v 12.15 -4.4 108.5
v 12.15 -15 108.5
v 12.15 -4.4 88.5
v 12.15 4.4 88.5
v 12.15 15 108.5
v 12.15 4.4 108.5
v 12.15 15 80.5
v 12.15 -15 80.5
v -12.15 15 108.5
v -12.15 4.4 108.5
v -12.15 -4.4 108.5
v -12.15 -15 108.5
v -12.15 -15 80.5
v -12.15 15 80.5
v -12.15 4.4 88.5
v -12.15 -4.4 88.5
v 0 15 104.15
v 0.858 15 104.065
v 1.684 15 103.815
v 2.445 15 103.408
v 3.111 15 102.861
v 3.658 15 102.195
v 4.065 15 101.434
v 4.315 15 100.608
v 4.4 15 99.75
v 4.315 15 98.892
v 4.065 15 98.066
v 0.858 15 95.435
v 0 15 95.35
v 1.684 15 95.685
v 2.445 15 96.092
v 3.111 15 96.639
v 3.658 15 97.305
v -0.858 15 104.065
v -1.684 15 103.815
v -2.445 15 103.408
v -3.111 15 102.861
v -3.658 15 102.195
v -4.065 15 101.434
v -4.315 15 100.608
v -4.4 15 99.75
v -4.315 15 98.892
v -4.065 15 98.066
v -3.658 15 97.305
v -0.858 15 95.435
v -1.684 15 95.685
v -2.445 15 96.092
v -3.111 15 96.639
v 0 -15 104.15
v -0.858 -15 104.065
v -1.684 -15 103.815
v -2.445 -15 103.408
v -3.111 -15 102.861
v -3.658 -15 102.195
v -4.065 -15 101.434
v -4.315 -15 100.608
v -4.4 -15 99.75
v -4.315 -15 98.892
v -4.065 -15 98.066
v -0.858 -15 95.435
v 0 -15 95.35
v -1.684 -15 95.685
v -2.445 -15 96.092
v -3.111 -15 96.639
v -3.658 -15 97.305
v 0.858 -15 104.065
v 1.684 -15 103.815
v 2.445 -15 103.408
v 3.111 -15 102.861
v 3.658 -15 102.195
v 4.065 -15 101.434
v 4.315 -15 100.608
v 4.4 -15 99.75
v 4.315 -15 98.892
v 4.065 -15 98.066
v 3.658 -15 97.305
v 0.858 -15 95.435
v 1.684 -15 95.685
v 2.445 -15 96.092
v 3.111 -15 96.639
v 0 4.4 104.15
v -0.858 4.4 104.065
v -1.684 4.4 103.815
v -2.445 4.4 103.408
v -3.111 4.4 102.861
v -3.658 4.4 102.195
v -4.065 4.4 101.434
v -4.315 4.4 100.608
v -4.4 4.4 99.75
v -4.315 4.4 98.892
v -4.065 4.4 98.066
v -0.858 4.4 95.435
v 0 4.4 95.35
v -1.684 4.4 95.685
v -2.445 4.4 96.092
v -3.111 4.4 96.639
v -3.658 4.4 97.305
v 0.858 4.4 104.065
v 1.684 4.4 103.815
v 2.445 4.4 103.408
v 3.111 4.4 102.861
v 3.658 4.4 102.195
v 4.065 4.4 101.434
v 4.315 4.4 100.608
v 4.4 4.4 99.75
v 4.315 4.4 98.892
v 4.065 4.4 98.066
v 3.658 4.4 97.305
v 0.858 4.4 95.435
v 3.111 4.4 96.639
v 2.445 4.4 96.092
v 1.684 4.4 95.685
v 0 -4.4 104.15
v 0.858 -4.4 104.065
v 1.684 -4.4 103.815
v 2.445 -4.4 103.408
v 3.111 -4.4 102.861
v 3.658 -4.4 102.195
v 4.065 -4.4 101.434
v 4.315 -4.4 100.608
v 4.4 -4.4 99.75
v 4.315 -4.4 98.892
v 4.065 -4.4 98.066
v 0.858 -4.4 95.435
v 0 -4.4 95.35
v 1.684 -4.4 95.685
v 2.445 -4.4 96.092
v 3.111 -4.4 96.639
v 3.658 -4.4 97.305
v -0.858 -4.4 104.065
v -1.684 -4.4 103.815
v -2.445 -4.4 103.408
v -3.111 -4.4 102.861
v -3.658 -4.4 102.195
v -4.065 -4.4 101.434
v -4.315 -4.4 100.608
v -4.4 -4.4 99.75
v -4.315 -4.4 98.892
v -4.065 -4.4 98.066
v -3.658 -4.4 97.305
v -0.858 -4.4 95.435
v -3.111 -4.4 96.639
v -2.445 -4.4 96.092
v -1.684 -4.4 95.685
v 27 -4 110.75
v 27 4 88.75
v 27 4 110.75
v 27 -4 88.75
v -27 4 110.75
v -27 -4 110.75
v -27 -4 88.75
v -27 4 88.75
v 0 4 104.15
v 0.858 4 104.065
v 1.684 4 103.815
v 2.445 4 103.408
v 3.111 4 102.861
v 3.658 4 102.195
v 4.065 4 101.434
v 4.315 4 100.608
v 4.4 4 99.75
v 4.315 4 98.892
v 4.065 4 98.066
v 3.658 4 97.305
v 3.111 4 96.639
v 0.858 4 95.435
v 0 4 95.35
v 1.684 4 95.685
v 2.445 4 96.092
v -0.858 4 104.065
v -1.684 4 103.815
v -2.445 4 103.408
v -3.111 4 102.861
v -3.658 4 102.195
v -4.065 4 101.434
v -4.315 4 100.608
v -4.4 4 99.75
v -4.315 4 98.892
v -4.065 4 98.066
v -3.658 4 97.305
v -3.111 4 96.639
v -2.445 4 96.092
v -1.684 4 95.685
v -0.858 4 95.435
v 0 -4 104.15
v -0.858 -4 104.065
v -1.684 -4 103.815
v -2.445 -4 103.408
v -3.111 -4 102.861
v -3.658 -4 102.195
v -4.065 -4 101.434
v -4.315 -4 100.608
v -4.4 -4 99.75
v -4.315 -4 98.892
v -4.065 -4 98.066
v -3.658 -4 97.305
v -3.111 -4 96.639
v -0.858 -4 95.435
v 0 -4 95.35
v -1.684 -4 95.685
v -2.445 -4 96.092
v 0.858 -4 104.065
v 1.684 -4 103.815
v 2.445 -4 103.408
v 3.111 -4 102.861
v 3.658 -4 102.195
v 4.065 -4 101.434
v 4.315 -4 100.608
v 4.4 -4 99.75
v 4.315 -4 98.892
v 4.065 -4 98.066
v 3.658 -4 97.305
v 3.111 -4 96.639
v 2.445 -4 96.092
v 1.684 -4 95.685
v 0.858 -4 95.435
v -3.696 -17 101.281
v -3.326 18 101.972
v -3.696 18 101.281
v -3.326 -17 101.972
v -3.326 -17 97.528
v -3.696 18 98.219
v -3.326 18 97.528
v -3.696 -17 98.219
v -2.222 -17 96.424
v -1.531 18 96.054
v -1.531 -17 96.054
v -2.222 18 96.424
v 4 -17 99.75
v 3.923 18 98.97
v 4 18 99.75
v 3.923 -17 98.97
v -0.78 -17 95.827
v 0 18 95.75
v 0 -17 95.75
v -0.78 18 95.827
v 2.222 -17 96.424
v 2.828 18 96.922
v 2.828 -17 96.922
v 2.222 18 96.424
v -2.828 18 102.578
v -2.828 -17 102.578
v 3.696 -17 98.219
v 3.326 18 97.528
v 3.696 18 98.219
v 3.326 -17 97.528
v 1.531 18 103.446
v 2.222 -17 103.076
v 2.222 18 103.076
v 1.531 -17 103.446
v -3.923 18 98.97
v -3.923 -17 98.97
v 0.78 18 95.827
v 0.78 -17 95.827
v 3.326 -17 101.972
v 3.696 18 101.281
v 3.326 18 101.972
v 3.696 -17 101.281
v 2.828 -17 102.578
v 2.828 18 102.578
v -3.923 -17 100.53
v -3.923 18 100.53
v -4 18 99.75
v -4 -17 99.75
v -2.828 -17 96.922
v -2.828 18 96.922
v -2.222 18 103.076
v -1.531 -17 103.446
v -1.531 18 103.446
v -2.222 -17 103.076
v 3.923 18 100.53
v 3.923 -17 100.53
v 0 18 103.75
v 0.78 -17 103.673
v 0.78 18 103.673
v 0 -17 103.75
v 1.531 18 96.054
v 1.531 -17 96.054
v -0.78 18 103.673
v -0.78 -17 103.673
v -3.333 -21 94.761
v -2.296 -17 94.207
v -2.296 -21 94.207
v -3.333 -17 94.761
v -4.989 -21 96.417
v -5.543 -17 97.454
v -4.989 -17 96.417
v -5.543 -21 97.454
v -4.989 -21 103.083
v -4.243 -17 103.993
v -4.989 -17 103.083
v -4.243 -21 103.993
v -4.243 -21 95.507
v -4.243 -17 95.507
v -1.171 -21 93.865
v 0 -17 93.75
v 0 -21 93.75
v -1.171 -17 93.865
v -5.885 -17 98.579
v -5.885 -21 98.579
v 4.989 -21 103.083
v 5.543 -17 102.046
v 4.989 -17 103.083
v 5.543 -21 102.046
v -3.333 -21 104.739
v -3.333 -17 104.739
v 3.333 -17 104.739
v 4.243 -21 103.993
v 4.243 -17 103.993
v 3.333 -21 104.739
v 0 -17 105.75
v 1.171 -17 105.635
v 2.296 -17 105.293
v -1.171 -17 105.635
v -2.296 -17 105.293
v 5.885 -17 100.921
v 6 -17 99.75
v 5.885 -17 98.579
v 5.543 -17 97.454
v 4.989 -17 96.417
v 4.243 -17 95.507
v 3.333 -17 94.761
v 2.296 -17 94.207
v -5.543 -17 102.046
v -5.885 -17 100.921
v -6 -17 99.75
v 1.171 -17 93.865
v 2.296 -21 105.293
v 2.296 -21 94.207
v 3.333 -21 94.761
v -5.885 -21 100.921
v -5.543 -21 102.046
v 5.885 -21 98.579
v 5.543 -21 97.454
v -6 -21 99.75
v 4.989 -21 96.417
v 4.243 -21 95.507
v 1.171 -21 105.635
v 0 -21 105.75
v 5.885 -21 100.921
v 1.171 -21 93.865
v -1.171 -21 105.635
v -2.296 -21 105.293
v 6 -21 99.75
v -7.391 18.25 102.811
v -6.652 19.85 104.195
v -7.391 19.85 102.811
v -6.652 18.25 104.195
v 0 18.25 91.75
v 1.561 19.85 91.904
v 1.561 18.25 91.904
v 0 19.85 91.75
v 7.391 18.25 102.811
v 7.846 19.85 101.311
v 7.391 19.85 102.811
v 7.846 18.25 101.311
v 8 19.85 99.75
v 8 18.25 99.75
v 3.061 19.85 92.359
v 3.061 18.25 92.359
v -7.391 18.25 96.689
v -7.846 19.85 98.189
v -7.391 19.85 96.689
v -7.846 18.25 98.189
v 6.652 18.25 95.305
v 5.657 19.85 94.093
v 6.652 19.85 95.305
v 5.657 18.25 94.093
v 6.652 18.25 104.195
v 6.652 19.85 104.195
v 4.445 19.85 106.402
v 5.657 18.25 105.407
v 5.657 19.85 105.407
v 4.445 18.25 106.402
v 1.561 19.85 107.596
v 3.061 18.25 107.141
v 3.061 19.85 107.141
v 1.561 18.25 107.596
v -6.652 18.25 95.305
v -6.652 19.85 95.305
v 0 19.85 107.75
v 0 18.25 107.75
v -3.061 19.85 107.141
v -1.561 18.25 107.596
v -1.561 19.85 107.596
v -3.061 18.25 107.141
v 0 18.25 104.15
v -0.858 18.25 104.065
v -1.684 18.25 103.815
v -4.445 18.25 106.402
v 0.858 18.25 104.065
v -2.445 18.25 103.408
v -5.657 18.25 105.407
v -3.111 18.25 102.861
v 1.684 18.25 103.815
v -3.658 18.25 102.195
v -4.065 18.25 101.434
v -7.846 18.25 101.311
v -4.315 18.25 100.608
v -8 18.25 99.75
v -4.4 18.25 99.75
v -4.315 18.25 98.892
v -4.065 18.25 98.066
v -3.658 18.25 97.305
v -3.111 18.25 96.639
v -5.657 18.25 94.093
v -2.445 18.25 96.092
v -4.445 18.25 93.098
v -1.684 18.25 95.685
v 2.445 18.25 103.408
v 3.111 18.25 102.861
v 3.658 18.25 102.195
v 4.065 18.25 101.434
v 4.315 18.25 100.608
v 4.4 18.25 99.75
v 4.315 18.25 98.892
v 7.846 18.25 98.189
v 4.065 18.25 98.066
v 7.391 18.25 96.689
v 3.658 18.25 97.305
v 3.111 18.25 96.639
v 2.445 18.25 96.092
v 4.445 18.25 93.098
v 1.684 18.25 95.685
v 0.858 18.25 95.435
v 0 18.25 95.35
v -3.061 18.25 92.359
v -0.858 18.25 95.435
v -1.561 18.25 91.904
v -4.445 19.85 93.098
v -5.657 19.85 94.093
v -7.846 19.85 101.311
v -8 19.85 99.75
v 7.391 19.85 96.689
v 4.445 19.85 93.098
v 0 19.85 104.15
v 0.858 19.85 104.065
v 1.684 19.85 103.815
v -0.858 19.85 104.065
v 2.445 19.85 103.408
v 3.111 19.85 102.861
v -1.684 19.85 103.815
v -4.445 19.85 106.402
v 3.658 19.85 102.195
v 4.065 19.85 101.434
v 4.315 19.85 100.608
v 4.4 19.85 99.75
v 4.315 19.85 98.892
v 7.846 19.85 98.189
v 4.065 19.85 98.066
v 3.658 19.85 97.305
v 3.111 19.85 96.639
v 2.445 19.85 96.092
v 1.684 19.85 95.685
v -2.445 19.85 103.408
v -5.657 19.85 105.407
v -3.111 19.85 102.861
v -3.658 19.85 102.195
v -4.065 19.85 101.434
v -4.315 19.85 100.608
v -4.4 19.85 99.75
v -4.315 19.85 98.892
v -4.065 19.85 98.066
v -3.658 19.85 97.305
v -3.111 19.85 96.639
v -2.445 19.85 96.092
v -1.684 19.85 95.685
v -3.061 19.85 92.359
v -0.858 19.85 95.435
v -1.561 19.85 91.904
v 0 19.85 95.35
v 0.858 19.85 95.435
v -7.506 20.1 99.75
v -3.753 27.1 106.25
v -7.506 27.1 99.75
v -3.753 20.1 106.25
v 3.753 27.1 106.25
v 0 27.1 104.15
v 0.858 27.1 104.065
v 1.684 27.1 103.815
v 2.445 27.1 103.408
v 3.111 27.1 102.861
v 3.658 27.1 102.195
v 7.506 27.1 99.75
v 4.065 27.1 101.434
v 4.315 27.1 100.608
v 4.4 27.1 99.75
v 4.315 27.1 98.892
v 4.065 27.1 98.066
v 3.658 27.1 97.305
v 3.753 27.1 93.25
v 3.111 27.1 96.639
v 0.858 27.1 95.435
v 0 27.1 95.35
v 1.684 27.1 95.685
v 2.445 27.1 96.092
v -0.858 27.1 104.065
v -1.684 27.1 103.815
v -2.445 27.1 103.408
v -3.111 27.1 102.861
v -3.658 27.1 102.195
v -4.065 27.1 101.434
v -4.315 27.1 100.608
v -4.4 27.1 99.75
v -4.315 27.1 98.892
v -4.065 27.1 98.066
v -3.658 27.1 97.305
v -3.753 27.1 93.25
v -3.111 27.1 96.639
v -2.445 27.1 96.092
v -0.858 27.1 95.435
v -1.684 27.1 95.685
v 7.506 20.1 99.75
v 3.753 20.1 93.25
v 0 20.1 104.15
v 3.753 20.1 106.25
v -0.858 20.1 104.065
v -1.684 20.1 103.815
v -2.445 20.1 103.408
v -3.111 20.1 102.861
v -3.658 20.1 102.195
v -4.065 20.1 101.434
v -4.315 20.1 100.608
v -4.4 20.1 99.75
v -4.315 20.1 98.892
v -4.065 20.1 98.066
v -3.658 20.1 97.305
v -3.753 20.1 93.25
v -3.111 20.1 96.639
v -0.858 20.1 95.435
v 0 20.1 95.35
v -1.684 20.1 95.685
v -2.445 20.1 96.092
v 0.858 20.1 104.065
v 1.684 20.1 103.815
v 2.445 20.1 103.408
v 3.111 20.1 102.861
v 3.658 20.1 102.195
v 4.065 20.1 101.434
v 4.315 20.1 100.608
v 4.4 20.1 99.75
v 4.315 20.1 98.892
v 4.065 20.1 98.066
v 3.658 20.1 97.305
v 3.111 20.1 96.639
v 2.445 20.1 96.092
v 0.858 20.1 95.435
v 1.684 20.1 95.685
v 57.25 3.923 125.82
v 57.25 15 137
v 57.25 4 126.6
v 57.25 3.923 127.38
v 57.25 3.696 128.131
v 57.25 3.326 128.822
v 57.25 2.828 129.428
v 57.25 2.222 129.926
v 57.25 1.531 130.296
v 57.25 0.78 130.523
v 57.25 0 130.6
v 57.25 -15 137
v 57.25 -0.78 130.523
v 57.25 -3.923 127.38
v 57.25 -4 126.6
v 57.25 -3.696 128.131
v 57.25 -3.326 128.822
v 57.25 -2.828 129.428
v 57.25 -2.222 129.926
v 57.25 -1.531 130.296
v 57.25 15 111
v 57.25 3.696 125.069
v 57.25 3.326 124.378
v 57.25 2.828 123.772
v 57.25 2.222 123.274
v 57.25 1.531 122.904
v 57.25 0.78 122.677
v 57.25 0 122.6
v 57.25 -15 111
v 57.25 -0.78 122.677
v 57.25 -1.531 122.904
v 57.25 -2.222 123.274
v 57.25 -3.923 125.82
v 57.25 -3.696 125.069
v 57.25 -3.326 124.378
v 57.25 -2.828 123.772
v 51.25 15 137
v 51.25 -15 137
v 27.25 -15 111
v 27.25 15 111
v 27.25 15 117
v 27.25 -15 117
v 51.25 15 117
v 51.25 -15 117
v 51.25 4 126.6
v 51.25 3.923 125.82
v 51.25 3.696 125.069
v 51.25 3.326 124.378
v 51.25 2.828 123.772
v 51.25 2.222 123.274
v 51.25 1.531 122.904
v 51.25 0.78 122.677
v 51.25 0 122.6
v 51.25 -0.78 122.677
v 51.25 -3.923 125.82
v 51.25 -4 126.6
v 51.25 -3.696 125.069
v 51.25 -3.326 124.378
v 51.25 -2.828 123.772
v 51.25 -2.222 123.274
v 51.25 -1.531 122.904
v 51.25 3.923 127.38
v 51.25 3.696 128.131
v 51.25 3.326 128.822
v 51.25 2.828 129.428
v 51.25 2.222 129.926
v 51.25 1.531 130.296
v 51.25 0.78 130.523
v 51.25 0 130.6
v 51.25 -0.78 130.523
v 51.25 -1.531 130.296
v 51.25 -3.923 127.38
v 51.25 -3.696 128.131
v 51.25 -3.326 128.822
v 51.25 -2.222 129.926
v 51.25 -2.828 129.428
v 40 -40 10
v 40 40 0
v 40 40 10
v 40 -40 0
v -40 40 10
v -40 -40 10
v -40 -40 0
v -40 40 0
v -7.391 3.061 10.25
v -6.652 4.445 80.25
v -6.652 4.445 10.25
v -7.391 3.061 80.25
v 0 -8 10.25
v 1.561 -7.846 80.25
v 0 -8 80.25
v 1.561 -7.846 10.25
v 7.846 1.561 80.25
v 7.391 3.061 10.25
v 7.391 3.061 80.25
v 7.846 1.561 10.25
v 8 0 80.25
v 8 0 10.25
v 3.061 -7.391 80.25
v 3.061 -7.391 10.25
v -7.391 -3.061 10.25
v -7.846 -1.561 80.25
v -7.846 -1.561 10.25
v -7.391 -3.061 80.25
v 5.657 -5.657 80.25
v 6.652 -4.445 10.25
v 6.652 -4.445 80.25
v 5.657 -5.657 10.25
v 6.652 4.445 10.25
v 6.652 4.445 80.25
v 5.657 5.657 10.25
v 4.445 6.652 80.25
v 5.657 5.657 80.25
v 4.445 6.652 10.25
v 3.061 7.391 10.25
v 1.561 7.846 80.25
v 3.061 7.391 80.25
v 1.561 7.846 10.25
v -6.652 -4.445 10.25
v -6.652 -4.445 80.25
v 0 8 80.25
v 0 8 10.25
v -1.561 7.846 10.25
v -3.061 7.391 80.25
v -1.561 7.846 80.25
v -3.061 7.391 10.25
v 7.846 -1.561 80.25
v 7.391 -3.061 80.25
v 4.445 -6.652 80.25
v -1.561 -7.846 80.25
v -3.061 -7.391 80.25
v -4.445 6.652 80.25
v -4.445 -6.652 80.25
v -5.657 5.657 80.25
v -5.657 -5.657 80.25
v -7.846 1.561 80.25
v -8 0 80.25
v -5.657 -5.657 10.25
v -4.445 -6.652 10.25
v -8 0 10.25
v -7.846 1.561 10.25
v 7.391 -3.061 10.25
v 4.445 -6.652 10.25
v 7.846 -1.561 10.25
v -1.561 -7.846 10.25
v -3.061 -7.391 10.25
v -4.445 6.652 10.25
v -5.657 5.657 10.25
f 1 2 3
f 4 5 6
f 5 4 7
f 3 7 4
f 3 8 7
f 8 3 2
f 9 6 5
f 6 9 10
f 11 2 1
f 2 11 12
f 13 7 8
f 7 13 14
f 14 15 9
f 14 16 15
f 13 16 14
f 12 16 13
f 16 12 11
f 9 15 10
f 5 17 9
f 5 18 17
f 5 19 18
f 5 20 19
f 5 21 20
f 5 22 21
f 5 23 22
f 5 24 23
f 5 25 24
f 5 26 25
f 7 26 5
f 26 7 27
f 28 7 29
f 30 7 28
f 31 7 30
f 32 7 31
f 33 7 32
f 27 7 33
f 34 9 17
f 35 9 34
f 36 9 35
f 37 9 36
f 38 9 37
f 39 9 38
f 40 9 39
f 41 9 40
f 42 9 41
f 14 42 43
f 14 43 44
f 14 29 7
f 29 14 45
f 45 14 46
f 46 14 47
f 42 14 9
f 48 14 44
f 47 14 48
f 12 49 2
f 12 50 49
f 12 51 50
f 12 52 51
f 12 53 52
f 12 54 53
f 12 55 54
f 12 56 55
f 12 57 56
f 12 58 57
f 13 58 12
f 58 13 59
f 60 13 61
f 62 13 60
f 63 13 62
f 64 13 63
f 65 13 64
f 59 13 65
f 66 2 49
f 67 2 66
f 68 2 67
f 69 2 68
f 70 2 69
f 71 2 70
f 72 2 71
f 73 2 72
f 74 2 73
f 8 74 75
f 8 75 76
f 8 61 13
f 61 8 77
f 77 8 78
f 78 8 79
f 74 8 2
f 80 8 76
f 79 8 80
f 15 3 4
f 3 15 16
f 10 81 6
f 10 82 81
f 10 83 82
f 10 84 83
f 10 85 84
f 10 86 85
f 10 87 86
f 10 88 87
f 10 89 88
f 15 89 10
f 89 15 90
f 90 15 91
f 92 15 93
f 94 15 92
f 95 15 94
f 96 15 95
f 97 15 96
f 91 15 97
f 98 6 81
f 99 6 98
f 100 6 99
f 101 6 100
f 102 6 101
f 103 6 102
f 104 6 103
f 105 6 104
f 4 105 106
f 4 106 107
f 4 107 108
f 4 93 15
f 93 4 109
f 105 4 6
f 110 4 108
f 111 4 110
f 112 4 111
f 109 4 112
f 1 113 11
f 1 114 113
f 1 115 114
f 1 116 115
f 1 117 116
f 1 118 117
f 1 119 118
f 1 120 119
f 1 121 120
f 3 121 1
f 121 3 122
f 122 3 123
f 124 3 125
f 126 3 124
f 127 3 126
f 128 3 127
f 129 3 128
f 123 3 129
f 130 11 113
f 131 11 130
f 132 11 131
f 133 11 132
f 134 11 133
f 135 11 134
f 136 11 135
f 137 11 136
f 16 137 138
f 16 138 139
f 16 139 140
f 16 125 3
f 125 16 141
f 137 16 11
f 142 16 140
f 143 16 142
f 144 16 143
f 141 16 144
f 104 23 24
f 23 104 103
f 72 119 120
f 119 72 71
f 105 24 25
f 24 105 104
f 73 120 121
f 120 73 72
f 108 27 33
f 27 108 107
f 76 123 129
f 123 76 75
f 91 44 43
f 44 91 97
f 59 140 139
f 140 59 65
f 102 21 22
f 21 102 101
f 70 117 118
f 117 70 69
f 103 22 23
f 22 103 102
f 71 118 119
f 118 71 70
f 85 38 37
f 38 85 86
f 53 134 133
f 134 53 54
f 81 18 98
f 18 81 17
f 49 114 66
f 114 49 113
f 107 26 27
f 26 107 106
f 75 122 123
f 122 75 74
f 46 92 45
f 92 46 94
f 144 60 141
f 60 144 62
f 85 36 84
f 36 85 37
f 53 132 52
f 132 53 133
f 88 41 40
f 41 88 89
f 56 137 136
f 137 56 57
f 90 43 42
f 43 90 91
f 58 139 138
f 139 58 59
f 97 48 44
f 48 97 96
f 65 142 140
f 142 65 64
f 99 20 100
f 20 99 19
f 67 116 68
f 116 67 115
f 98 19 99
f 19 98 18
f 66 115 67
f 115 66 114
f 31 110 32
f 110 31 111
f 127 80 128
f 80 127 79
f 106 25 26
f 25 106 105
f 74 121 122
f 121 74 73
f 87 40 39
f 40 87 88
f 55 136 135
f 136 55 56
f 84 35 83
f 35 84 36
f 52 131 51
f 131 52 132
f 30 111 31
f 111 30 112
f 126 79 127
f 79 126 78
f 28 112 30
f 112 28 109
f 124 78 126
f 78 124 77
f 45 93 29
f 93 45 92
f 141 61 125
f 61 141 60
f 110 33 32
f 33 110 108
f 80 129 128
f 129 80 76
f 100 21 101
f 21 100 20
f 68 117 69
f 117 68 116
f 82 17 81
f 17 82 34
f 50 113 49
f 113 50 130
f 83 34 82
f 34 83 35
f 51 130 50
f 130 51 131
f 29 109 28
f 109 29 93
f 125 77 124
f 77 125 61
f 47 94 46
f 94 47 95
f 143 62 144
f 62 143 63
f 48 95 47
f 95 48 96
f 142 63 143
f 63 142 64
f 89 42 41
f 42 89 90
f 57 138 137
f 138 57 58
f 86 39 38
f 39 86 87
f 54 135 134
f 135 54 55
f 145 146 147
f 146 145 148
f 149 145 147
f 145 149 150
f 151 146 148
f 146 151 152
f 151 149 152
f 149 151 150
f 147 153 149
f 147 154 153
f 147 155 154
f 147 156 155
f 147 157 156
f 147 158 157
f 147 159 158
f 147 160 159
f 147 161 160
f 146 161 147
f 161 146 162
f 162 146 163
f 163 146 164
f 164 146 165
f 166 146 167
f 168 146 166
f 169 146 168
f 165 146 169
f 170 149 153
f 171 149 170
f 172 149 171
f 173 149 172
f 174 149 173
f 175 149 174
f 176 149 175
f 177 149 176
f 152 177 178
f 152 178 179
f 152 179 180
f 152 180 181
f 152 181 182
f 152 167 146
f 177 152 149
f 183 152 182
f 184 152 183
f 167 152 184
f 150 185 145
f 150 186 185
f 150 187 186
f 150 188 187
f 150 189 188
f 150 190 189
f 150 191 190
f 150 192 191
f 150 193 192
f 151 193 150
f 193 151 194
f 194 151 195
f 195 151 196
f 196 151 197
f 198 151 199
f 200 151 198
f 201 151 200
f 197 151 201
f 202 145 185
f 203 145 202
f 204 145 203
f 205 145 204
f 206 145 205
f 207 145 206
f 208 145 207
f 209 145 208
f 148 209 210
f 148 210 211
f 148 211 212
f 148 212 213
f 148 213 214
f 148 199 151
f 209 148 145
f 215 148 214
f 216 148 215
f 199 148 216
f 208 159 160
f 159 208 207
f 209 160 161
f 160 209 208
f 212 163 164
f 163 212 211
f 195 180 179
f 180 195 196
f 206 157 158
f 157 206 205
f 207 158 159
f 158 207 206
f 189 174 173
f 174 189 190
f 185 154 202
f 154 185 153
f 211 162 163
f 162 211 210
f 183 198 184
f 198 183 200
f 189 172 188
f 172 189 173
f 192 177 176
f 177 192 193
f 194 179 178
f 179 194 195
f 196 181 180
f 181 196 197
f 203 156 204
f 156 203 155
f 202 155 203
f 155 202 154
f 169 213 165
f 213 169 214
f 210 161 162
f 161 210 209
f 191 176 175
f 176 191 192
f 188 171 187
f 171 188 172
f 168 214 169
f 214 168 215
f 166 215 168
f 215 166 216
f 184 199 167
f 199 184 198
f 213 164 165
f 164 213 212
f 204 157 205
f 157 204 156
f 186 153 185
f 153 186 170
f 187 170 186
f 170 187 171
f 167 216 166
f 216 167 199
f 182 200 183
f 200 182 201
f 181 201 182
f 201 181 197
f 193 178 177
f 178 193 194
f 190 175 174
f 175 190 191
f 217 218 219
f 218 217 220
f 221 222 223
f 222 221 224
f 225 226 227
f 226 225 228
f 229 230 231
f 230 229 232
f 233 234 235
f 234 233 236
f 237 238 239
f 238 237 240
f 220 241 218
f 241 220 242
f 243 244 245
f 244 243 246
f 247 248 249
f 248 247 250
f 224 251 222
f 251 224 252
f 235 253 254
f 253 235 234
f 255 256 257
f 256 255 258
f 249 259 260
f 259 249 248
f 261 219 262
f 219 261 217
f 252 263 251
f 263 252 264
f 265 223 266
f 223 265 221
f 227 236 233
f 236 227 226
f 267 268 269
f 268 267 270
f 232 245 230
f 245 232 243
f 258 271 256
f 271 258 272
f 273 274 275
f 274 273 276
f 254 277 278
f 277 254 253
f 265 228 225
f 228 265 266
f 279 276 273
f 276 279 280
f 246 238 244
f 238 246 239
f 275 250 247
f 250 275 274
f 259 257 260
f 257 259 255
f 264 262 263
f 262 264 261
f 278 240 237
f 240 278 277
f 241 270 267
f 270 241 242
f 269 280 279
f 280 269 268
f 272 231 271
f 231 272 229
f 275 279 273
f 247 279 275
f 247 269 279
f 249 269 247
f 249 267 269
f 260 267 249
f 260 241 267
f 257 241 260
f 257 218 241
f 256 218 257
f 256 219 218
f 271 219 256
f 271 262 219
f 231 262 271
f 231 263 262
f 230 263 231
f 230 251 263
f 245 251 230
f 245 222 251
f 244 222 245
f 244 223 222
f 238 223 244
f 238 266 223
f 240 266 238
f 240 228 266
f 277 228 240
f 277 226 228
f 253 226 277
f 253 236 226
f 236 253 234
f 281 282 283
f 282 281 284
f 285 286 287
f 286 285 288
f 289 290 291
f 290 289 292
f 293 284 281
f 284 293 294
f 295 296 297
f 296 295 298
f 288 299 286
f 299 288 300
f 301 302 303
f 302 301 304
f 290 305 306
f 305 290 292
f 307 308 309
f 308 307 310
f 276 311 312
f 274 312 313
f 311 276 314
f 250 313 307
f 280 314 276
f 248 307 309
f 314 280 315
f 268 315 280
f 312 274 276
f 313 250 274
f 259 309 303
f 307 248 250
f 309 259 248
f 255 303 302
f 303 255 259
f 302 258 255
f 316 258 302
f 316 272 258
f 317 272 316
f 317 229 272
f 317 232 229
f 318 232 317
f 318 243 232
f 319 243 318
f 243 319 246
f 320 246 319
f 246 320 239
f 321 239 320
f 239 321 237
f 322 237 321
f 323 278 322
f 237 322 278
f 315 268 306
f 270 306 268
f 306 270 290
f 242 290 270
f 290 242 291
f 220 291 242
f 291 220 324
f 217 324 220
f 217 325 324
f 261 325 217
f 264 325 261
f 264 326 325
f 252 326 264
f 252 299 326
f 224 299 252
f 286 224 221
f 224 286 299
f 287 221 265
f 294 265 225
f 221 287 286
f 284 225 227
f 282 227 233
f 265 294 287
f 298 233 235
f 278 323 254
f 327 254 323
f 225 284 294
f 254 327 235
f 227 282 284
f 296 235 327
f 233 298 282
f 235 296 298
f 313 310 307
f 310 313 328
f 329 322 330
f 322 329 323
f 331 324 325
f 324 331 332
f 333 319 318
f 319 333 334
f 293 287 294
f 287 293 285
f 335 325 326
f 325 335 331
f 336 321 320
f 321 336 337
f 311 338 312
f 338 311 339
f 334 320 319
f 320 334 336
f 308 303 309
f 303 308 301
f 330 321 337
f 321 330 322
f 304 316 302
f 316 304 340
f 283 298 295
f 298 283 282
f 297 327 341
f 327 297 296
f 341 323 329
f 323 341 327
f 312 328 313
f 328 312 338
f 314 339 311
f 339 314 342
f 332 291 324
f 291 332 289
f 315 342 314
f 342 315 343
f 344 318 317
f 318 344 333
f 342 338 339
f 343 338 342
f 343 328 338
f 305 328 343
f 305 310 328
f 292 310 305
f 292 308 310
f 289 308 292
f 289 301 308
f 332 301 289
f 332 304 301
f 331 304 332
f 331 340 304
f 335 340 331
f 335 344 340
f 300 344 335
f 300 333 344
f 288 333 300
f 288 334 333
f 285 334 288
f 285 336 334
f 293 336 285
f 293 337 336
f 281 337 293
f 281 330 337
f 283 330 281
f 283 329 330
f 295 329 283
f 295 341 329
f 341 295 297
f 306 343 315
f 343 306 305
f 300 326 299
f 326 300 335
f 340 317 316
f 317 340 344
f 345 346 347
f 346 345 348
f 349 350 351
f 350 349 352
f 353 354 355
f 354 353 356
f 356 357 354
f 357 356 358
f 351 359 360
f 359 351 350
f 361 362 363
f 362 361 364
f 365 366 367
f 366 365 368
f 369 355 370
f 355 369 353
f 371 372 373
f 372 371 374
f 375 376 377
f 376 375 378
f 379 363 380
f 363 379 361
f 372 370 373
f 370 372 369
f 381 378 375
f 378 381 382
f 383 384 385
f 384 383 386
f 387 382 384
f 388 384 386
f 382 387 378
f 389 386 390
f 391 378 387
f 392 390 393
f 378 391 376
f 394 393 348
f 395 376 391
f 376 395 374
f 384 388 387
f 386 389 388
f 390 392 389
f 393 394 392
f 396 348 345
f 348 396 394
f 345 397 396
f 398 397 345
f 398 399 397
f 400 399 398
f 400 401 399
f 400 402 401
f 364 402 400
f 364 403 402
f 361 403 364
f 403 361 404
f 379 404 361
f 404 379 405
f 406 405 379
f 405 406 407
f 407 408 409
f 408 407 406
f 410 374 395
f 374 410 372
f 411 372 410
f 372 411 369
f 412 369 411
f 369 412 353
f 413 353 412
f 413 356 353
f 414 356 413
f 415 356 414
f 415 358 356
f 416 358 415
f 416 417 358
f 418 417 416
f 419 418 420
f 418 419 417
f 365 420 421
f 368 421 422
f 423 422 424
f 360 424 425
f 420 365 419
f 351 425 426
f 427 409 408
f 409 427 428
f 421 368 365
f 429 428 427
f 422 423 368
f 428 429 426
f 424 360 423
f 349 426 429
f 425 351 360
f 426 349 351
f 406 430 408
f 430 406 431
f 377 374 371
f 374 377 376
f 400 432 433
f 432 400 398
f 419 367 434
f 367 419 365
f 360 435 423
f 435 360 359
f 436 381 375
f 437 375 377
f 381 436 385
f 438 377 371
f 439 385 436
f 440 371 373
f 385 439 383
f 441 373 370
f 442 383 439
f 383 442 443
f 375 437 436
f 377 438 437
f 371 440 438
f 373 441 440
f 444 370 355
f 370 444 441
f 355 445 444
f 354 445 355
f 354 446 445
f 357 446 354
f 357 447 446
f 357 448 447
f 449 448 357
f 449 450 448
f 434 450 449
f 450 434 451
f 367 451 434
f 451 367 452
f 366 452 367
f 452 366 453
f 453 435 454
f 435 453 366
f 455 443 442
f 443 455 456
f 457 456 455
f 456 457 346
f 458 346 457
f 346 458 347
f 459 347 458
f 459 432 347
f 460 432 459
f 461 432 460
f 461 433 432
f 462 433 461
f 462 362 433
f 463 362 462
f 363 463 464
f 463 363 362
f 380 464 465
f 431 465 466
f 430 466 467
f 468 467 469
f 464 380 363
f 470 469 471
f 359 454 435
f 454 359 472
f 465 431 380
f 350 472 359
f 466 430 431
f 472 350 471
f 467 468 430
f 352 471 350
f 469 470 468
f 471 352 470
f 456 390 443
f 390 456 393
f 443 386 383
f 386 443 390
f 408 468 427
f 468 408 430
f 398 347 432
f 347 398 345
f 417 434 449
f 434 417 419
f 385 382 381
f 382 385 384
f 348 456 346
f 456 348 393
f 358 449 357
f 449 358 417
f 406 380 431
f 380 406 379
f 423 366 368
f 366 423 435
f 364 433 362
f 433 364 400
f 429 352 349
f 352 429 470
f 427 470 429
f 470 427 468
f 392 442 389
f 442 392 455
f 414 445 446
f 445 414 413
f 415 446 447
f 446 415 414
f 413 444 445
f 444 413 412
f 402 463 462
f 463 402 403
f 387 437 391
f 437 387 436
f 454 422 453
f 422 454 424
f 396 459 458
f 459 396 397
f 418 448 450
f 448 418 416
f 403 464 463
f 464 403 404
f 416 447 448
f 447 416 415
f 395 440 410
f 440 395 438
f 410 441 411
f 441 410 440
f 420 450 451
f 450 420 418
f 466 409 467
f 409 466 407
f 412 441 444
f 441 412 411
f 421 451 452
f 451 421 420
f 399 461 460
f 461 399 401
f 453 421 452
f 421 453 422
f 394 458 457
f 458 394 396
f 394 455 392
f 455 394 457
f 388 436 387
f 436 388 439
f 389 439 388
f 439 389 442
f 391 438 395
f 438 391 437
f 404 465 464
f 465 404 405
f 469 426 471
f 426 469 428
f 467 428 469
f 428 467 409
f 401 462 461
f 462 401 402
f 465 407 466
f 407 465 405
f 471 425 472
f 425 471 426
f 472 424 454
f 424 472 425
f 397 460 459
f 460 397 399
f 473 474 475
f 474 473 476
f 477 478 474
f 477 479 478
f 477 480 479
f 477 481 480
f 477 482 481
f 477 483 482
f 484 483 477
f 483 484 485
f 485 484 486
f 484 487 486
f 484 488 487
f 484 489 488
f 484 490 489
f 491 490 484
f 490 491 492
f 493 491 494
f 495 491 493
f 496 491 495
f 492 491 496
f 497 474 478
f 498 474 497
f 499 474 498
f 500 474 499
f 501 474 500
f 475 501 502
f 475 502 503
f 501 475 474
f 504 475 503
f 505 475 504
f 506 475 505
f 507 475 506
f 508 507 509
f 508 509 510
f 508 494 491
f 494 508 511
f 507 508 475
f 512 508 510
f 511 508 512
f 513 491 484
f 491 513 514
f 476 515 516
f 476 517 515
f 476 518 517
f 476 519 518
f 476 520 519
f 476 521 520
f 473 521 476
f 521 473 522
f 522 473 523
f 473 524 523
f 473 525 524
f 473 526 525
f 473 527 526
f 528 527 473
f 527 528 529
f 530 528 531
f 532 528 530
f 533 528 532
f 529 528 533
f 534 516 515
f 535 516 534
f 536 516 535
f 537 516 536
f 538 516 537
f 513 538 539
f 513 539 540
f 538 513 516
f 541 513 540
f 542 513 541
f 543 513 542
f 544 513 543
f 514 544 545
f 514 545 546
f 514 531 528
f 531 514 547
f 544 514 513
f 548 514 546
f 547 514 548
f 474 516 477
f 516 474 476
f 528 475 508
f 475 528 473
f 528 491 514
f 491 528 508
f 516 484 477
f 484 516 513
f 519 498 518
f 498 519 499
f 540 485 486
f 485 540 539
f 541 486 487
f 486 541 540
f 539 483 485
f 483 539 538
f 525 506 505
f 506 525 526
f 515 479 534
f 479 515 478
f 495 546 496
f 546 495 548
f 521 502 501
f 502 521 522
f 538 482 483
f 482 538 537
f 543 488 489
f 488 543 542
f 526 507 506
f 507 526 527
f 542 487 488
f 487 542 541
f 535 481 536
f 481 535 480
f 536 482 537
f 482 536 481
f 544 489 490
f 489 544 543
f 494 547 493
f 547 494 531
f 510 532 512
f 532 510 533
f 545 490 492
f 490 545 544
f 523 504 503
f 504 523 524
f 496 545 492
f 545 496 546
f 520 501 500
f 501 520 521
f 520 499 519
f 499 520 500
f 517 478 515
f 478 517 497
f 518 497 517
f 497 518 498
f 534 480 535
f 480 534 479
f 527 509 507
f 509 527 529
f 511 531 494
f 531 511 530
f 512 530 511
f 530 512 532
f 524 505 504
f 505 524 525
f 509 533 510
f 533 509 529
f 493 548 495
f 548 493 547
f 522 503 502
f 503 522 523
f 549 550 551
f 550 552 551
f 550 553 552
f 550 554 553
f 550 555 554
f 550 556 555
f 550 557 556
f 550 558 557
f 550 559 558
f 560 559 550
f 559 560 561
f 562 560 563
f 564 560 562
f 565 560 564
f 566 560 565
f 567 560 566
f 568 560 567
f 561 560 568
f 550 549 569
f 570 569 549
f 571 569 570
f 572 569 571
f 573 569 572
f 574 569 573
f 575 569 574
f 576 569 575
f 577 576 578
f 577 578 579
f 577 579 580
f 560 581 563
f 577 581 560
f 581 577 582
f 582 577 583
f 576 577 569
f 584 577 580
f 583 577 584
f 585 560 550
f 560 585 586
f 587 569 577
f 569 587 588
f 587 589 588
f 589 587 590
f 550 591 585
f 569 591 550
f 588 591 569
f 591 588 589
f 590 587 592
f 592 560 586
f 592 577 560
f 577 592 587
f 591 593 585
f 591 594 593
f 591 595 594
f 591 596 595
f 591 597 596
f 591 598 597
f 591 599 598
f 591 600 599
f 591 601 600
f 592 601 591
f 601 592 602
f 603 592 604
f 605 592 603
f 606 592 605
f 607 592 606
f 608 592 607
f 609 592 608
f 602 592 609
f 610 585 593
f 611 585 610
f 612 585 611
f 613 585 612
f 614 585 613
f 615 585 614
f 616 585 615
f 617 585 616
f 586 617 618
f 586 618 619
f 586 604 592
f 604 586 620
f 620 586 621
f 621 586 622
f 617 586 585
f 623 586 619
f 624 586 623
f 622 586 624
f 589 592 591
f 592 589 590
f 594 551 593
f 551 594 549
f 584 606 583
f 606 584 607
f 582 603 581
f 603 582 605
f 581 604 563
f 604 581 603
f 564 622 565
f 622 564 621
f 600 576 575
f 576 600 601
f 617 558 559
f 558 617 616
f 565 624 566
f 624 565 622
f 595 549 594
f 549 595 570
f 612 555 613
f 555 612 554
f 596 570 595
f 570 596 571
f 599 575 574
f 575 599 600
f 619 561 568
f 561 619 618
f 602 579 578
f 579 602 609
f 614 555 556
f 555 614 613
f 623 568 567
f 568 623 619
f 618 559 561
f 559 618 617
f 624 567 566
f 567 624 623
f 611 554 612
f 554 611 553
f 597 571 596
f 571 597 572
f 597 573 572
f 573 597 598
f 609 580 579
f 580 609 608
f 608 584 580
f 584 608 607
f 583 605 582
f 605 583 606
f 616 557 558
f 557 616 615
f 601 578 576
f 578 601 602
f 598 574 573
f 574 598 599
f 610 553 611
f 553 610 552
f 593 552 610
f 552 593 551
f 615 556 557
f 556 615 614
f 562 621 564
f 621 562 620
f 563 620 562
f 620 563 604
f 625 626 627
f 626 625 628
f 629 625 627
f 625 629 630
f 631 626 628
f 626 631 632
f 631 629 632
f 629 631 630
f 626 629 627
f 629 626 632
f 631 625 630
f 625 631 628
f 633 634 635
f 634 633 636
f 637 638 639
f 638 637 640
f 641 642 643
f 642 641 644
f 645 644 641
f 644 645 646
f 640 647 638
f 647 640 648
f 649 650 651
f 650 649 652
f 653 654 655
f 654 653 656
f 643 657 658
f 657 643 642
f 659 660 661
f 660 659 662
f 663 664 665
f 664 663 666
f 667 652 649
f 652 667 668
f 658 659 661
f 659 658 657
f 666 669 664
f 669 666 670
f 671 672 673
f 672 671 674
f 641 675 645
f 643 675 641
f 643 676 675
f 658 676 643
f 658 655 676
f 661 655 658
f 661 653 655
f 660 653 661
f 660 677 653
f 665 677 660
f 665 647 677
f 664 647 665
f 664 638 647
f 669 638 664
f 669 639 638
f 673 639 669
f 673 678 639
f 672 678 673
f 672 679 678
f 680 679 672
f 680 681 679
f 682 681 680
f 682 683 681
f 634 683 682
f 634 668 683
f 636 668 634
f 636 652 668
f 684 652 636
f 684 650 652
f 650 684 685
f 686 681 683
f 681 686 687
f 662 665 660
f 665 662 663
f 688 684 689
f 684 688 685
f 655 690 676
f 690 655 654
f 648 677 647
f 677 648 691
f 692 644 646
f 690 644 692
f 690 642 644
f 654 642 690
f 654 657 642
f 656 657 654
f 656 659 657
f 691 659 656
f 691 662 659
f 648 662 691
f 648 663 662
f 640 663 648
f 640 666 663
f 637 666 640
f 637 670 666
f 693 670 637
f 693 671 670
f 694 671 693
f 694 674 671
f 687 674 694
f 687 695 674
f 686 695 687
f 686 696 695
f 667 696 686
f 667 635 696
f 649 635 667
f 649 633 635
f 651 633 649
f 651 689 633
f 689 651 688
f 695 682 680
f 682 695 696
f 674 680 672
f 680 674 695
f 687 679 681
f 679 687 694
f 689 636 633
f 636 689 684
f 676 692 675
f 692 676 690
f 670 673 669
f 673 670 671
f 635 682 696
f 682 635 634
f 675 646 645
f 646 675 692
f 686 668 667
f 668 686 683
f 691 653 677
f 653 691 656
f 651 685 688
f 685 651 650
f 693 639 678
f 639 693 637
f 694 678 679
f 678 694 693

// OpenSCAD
$fn = 32;

// ------------------------------------------------------------------------
// Lamp arm: column d16 x 70 mm, arm 54 mm
// Every part is its own module, assembly() places every instance.
// ------------------------------------------------------------------------

// --- part 1 ---
module lamp_base() {
  difference() {
    translate([-40, -40, 0]) cube([80, 80, 10]);
  }
}

// --- part 2 ---
module lamp_column() {
  cylinder(h = 70, d = 16);
}

// --- part 3 ---
module head_fork() {
  difference() {
    translate([-12.15, -15, 0]) cube([24.3, 30, 28]);
    translate([-13.15, -4.4, 8]) cube([26.3, 8.8, 21]);
    translate([0, 0, 19.25]) rotate([90, 0, 0]) cylinder(h = 32, d = 8.8, center = true);
  }
}

// --- part 4 ---
module lamp_arm() {
  difference() {
    translate([-27, -4, 0]) cube([54, 8, 22]);
    translate([0, 0, 11]) rotate([90, 0, 0]) cylinder(h = 10, d = 8.8, center = true);
  }
}

// --- part 5 ---
module arm_pin() {
  rotate([0, 90, 0]) cylinder(h = 36, d = 8, center = true);
  translate([-21, 0, 0]) rotate([0, 90, 0]) cylinder(h = 4, d = 12);
}

// --- part 6 ---
module arm_washer() {
  difference() {
      translate([0, 0, 0]) cylinder(h = 1.6, d = 16);
      translate([0, 0, -1]) cylinder(h = 3.6, d = 8.8);
    }
}

// --- part 7 ---
module arm_nut() {
  difference() {
    linear_extrude(height = 7) polygon(points = [[7.506, 0], [3.753, 6.5], [-3.753, 6.5], [-7.506, 0], [-3.753, -6.5], [3.753, -6.5]]);
    translate([0, 0, -1]) cylinder(h = 9, d = 8.8);
  }
}

// --- part 8 ---
module shade_bracket() {
  difference() {
    translate([-15, -15, 0]) cube([30, 30, 26]);
    translate([-16, -16, 6]) cube([25, 32, 21]);
    translate([12, 0, 15.6]) rotate([0, 90, 0]) cylinder(h = 8, d = 8, center = true);
  }
}

// --- assembly ---
module assembly() {
  color([0.80, 0.24, 0.20]) translate([0, 0, 0]) rotate([0, 0, 0]) lamp_base();
  color([0.20, 0.45, 0.75]) translate([0, 0, 10.25]) rotate([0, 0, 0]) lamp_column();
  color([0.25, 0.62, 0.32]) translate([0, 0, 80.5]) rotate([0, 0, 0]) head_fork();
  color([0.92, 0.70, 0.18]) translate([0, 0, 88.75]) rotate([0, 0, 0]) lamp_arm();
  color([0.58, 0.35, 0.70]) translate([0, 0, 99.75]) rotate([0, 0, 90]) arm_pin();
  color([0.16, 0.66, 0.66]) translate([0, 19.85, 99.75]) rotate([90, 0, 0]) arm_washer();
  color([0.85, 0.48, 0.18]) translate([0, 27.1, 99.75]) rotate([90, 0, 0]) arm_nut();
  color([0.55, 0.60, 0.65]) translate([42.25, 0, 111]) rotate([0, 0, 0]) shade_bracket();
}

assembly();
